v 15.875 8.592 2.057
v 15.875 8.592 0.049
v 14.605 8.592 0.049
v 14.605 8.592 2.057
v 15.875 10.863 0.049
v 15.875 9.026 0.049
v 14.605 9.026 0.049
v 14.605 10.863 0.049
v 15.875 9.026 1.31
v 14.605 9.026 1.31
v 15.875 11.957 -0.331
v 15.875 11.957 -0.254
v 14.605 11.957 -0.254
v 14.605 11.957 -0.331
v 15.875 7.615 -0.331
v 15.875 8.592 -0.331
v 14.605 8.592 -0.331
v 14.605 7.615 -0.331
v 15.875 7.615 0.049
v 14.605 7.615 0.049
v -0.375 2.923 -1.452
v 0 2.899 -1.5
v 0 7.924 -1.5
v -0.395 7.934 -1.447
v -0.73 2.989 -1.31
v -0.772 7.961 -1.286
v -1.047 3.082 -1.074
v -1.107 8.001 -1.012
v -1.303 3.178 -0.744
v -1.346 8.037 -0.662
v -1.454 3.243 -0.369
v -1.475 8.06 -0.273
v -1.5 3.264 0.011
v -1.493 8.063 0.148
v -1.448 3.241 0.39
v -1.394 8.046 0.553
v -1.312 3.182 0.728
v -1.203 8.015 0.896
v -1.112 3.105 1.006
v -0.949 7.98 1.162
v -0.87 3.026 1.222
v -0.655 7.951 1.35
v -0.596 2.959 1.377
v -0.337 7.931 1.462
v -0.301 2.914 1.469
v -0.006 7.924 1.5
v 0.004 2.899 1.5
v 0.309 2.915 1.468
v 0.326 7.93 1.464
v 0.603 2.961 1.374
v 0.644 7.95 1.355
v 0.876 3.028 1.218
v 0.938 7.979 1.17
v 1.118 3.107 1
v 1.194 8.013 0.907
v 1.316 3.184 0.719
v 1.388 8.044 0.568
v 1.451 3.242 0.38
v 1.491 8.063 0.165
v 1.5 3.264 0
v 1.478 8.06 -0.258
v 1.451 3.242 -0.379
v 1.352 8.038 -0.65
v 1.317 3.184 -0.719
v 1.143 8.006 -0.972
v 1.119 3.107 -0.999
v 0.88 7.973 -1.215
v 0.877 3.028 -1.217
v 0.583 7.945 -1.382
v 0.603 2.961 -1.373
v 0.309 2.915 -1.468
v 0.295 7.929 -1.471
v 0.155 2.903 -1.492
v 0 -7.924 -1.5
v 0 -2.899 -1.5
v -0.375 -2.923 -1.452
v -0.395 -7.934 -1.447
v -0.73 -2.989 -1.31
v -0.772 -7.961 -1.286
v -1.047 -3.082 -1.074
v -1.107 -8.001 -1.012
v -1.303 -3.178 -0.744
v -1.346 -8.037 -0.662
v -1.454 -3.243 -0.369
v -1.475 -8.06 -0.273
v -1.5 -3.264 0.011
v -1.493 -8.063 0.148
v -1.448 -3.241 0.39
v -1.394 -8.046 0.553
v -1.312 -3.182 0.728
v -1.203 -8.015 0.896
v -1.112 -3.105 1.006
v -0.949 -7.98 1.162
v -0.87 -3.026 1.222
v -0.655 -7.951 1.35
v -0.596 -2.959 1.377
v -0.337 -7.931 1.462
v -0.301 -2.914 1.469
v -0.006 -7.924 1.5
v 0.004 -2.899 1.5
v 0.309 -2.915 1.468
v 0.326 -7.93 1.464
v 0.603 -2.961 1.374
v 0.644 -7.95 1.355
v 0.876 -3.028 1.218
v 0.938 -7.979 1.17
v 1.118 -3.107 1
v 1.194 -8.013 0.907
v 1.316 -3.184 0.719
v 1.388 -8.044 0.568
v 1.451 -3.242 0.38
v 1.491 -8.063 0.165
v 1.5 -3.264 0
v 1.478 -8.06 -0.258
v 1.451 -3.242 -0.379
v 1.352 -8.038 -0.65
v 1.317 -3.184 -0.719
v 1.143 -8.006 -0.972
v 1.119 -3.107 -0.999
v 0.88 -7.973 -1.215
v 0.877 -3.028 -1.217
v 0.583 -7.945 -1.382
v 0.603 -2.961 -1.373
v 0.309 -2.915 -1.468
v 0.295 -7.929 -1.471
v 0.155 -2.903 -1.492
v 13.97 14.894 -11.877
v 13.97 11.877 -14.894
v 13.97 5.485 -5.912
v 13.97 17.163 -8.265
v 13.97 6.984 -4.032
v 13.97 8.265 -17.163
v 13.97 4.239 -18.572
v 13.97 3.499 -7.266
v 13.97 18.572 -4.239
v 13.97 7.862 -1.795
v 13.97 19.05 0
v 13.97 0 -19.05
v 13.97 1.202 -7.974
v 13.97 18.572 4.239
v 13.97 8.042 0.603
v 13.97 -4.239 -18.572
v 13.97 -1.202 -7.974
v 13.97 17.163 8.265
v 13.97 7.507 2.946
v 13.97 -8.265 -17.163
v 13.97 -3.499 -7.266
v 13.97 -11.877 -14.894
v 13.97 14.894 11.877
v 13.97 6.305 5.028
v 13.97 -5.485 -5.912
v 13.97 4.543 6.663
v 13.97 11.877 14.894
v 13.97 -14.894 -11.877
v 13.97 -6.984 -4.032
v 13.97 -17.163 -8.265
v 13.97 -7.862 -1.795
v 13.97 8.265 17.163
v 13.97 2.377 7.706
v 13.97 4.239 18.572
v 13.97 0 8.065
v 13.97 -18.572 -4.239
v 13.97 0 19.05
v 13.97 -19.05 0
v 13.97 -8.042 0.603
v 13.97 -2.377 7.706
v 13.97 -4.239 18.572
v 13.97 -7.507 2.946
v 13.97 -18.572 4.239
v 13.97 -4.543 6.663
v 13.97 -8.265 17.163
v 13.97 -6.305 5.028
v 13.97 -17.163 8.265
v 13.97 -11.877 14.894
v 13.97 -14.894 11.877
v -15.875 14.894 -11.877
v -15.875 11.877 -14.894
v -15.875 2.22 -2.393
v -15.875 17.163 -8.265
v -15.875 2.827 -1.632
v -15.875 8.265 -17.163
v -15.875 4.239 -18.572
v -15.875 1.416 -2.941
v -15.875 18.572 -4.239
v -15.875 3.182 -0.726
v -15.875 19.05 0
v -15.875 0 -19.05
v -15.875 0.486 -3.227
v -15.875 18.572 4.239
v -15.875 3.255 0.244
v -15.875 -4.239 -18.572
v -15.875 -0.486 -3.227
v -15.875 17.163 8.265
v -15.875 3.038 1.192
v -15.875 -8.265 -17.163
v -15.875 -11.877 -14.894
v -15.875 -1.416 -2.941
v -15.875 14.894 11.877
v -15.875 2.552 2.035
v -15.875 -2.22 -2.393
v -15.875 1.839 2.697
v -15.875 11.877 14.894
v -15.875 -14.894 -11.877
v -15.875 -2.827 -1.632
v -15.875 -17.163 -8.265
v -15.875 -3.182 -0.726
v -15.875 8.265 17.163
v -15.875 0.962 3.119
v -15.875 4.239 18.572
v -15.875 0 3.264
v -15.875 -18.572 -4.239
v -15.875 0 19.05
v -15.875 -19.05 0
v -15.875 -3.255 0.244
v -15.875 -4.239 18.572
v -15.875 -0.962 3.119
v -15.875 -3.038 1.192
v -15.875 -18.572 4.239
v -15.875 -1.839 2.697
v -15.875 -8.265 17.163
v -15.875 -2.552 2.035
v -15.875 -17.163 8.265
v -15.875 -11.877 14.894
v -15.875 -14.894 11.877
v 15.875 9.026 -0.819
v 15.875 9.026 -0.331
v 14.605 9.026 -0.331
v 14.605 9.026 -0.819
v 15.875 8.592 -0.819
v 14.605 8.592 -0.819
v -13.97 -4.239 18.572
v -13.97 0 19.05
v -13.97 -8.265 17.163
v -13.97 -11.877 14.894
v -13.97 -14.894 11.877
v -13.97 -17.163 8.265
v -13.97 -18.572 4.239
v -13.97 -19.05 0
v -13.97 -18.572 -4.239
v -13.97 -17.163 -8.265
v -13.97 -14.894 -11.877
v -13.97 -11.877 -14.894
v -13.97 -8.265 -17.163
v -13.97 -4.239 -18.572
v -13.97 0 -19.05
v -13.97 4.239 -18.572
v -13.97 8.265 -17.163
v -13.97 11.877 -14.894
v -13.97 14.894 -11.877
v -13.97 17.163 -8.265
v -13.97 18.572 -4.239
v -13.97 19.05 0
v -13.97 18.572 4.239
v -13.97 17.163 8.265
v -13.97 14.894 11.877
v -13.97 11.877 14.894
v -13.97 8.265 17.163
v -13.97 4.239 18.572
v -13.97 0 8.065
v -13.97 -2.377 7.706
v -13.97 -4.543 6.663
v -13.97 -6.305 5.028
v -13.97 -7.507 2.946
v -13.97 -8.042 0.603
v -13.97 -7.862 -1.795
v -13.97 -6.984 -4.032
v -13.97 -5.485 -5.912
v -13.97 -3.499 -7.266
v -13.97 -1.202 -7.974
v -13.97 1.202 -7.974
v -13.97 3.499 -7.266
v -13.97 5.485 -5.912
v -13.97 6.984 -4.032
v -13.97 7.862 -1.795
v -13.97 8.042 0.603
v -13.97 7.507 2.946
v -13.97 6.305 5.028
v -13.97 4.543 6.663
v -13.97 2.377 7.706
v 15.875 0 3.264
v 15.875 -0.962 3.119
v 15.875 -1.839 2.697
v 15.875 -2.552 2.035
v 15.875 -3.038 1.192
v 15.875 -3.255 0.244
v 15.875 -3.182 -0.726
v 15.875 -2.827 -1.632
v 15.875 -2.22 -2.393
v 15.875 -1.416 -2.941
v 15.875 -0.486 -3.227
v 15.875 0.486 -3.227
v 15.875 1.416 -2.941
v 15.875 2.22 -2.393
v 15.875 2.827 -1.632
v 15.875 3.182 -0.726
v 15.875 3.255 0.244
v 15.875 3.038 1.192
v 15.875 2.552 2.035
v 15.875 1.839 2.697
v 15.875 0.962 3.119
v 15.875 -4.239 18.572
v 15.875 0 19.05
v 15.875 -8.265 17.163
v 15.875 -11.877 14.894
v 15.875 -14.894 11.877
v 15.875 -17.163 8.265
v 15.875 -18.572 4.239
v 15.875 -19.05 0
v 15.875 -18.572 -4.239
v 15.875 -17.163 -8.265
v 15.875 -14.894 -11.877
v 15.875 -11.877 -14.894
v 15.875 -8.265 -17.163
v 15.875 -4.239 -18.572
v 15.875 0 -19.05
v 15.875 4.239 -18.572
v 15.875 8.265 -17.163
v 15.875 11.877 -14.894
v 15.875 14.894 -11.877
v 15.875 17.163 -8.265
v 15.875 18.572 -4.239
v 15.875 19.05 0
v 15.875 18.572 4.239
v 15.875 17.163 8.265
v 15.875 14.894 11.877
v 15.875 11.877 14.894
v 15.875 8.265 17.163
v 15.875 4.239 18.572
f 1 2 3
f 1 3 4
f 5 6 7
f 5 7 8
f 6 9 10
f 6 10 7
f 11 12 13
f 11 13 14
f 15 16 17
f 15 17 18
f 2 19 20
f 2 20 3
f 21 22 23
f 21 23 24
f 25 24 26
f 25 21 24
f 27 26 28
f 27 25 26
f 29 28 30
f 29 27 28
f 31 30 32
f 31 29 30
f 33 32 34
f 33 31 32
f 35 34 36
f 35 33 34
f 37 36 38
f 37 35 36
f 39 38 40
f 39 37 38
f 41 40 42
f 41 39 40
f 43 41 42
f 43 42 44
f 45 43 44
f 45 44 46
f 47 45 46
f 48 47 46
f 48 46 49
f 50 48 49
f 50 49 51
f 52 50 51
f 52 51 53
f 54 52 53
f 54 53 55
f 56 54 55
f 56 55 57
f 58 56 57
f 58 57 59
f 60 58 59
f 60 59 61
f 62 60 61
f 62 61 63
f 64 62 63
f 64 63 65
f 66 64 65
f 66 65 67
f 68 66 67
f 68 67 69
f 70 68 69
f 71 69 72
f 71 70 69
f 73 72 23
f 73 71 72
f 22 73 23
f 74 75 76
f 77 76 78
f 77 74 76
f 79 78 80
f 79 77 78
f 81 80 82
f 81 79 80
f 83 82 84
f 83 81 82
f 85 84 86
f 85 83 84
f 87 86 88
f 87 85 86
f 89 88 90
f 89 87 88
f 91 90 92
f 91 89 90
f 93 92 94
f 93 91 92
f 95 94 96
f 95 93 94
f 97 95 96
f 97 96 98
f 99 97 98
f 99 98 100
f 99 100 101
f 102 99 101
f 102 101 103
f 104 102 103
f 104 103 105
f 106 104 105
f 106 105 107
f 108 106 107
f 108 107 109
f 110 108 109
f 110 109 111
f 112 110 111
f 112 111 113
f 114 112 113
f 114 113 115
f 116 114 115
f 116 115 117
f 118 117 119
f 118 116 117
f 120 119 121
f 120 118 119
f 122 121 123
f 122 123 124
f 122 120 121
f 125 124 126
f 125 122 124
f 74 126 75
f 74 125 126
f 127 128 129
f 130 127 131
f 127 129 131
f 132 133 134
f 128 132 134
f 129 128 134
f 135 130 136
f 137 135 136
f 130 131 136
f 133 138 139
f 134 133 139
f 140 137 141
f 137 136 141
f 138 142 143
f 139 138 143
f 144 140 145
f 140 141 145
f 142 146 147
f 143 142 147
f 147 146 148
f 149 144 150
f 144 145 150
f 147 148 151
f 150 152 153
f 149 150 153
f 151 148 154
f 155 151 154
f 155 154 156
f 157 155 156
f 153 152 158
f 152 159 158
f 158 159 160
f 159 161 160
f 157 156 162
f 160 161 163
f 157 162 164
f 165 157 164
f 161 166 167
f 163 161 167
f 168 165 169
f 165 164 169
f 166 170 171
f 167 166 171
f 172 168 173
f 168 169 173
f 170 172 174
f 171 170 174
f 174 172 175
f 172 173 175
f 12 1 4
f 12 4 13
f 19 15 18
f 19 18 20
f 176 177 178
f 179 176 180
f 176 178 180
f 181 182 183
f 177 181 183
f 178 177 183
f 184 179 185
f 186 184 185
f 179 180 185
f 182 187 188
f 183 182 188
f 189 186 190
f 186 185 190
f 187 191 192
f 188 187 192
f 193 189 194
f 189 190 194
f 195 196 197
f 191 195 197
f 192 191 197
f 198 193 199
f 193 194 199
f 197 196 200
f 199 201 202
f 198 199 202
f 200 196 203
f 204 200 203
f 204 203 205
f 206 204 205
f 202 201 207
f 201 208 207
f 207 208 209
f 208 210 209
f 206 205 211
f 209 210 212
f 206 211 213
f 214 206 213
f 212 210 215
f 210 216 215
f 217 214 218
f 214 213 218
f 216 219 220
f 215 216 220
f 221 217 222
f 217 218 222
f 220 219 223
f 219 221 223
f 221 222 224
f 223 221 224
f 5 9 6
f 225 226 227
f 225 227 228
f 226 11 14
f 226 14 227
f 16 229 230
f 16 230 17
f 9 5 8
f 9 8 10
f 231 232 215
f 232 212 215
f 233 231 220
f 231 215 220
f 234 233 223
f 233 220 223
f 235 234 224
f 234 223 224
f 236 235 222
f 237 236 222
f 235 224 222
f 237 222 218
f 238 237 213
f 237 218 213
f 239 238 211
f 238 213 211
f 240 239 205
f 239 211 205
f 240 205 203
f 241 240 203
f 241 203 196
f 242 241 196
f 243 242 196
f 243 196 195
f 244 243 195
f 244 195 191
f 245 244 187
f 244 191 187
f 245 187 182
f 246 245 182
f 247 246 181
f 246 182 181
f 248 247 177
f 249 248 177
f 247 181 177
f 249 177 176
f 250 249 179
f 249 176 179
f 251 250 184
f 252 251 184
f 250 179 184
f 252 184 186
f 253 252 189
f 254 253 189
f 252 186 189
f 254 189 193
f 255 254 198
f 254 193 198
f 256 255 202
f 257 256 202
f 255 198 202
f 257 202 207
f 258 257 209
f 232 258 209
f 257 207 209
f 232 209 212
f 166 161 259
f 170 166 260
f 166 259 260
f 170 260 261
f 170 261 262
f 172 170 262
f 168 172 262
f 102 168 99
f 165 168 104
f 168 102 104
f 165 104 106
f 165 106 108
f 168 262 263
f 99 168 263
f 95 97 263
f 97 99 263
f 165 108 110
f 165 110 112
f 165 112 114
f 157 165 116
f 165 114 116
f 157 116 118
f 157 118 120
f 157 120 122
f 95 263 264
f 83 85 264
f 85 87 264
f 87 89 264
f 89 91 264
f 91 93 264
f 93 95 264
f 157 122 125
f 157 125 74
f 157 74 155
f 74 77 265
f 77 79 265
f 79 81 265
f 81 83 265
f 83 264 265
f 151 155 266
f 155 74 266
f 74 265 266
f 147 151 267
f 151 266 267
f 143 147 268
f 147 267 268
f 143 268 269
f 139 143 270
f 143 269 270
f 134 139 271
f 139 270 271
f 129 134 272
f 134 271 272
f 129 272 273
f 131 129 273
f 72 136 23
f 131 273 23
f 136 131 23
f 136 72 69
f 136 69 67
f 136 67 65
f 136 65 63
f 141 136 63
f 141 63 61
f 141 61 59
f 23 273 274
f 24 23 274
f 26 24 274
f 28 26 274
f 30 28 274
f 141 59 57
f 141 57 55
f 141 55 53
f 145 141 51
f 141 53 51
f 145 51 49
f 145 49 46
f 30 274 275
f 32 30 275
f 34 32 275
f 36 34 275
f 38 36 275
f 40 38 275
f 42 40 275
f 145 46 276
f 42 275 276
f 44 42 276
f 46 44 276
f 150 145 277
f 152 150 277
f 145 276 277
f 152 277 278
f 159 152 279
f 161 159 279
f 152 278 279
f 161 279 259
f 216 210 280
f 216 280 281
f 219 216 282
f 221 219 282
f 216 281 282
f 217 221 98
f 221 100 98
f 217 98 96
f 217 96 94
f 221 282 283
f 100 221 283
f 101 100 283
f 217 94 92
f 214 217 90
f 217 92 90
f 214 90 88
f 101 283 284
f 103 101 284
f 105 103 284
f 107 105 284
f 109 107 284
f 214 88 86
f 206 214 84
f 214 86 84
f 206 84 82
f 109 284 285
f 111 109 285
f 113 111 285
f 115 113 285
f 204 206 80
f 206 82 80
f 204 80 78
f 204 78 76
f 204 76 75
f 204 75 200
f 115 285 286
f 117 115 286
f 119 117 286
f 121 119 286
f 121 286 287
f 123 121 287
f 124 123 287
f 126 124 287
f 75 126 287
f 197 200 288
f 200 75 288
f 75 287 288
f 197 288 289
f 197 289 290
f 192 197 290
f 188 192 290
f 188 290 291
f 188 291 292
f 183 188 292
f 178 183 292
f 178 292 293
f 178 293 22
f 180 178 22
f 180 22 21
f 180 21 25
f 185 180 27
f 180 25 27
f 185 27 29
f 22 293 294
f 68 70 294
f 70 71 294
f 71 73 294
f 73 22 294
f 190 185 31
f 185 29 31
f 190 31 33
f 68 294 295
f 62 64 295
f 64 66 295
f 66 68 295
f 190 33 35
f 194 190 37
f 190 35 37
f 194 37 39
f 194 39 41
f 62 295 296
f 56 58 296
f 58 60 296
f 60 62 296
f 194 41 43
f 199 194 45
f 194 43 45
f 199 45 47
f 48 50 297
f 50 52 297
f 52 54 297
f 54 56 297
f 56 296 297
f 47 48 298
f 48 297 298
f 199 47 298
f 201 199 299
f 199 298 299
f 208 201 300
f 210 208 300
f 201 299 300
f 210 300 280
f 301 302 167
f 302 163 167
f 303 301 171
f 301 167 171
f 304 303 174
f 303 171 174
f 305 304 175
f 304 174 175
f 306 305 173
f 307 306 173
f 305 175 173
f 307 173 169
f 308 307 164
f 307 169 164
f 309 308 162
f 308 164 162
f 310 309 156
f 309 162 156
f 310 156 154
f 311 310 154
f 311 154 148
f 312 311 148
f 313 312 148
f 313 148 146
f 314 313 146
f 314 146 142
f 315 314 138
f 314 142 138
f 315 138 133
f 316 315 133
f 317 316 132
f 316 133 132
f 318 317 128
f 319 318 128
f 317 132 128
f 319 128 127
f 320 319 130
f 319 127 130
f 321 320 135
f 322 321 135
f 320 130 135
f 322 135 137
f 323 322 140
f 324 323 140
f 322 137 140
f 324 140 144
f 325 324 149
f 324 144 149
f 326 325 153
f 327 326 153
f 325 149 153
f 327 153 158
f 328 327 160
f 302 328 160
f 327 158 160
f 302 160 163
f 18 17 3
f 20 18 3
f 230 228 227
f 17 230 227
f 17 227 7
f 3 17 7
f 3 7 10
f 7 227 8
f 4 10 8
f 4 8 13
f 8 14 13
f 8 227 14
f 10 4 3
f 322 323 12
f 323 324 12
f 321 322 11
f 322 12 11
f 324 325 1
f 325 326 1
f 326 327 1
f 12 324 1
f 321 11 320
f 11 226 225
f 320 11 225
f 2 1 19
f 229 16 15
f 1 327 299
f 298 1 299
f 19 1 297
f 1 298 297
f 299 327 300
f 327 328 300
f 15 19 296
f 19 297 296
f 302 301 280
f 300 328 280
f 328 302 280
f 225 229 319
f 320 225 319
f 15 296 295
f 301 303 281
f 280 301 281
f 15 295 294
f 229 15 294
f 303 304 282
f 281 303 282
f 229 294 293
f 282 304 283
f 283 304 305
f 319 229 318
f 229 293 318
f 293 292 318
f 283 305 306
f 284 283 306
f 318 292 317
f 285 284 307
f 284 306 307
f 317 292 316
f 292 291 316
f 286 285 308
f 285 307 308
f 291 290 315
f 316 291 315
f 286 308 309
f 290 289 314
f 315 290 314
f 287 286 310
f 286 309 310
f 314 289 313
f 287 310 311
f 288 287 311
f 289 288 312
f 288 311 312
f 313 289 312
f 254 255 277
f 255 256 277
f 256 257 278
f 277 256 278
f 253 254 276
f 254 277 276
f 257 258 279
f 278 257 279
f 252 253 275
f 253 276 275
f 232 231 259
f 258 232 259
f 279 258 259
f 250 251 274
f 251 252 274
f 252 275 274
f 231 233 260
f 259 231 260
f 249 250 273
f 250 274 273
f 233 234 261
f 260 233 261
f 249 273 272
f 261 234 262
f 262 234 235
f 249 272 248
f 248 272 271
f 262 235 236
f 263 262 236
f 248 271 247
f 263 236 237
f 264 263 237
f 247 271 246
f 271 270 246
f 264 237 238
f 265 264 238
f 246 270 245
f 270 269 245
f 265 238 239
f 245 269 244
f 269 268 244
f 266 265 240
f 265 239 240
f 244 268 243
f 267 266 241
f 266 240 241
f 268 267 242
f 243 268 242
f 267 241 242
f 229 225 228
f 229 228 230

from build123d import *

# Parameters (mm, degrees)
CUT_EXTRUDE1_DEPTH      = 32.270123521
CUT_EXTRUDE1_DEPTH_BACK = 32.270123521
SKETCH2_R               = 1.5
CUT_EXTRUDE2_DEPTH      = 1.27


with BuildPart() as part:
    # Sketch1 → Revolve1 (revolve)
    with BuildSketch(Plane.XY):
        Polygon((15.875, 3.2639), (15.875, 19.05), (13.97, 19.05), (13.97, 8.0645), (-13.97, 8.0645), (-13.97, 19.05), (-15.875, 19.05), (-15.875, 3.2639), align=None)
    revolve(axis=Axis((-15.275524476, 0, 0), (1, 0, 0)))

    # Sketch2 → Cut-Extrude1 (cut, two sides: drawn at the far end of the back side and taken through both)
    with BuildSketch(Plane(origin=(0, 0, 0), x_dir=(1, 0, 0), z_dir=(0, 1, 0)).offset(-CUT_EXTRUDE1_DEPTH_BACK)):
        Circle(SKETCH2_R)
    extrude(amount=CUT_EXTRUDE1_DEPTH + CUT_EXTRUDE1_DEPTH_BACK, mode=Mode.SUBTRACT)

    # Sketch3 → Cut-Extrude2 (cut)
    with BuildSketch(Plane(origin=(15.875, 0, 0), x_dir=(0, 0, -1), z_dir=(1, 0, 0))):
        Polygon((0.253501878, 11.957106949), (0.330672017, 11.957106949), (0.330672017, 9.026337718), (0.819133555, 9.026337718), (0.819133555, 8.592149684), (0.330672017, 8.592149684), (0.330672017, 7.615226607), (-0.049242513, 7.615226607), (-0.049242513, 8.592149684), (-2.057362172, 8.592149684), align=None)
        Polygon((-0.049242513, 9.026337718), (-0.049242513, 10.863156629), (-1.310253464, 9.026337718), align=None, mode=Mode.SUBTRACT)
    extrude(amount=-CUT_EXTRUDE2_DEPTH, mode=Mode.SUBTRACT)


solid = part.part
